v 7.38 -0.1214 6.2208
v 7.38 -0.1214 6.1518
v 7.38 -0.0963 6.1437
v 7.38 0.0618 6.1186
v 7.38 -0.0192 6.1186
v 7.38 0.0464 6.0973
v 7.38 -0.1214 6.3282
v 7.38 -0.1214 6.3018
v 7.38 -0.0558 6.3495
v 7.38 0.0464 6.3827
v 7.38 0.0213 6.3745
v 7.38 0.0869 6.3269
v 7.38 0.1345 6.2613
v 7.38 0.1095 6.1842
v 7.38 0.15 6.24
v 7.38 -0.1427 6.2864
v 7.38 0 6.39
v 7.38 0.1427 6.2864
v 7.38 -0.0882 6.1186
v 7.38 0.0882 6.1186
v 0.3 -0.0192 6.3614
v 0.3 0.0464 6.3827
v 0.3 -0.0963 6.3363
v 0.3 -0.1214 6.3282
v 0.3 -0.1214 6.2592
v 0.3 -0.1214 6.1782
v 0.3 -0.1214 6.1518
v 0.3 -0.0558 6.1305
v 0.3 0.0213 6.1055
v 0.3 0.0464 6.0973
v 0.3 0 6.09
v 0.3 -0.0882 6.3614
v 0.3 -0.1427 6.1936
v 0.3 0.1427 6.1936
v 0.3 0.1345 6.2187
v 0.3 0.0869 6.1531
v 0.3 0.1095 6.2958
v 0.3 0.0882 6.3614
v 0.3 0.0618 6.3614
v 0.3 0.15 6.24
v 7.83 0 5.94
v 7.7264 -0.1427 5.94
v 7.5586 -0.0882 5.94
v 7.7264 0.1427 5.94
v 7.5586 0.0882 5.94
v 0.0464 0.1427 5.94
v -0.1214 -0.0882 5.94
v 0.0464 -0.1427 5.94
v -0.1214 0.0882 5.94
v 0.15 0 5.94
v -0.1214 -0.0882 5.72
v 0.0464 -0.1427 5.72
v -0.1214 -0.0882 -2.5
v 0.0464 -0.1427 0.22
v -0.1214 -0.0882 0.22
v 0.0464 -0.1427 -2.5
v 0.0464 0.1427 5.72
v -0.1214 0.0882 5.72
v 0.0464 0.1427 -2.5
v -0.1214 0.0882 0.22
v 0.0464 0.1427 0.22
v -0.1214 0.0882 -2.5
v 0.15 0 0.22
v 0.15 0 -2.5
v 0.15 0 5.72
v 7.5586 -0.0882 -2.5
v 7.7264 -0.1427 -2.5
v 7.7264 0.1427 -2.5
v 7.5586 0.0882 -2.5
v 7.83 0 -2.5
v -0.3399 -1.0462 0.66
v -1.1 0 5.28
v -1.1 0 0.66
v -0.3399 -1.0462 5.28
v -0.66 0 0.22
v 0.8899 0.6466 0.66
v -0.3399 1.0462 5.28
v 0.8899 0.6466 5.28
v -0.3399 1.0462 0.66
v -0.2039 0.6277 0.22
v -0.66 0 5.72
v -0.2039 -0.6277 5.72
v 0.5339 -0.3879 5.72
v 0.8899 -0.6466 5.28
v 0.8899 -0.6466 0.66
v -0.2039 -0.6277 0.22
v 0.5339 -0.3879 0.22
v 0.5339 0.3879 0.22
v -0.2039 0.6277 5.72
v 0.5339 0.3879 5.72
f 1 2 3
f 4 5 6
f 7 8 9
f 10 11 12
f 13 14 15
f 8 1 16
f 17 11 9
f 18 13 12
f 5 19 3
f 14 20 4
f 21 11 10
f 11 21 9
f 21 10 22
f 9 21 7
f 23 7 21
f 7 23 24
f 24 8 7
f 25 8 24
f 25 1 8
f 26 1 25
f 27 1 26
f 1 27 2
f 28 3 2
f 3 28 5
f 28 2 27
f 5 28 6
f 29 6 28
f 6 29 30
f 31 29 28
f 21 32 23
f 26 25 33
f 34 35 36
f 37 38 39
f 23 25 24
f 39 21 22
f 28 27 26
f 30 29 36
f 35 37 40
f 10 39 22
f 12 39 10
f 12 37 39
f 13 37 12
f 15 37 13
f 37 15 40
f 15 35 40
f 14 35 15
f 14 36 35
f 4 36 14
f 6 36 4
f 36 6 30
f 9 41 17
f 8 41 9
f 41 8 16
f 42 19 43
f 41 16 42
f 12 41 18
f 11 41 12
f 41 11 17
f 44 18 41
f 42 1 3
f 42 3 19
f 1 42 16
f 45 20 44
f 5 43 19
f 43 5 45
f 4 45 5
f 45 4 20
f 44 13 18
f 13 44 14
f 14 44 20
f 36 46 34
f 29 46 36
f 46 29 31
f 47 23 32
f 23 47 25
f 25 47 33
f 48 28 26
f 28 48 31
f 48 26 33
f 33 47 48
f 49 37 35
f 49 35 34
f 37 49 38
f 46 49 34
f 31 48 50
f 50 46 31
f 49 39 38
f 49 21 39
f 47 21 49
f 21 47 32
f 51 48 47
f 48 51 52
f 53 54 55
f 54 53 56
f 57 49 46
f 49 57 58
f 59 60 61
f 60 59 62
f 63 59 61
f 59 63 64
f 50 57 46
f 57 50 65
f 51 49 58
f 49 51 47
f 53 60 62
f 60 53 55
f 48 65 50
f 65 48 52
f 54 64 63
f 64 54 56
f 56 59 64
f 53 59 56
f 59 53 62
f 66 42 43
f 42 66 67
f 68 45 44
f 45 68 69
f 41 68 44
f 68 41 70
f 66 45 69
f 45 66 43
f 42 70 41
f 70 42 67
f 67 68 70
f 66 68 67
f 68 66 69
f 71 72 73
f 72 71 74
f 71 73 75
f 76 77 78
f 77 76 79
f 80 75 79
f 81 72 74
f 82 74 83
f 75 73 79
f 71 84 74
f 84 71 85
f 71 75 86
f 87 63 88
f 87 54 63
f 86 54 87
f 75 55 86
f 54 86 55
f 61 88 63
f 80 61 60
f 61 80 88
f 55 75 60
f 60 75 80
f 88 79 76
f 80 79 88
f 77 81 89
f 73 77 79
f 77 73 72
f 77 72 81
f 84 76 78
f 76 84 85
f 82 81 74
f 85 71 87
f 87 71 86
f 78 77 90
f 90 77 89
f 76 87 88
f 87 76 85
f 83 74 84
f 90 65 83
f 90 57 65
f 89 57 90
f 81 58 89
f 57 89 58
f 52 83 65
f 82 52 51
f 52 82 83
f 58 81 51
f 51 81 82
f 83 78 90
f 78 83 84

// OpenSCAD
// Model for parametric acy() package
//
// Copyright (C) 2023 Erich Heinzle
//
// File distribution license:
//  This library is free software; you can redistribute it and/or
//  modify it under the terms of the GNU Lesser General Public
//  License as published by the Free Software Foundation; either
//  version 2.1 of the License, or (at your option) any later version.
//
//  This library is distributed in the hope that it will be useful,
//  but WITHOUT ANY WARRANTY; without even the implied warranty of
//  MERCHANTABILITY or FITNESS FOR A PARTICULAR PURPOSE.  See the GNU
//  Lesser General Public License for more details.
//
//  You should have received a copy of the GNU Lesser General Public
//  License along with this library; if not, write to the Free Software
//  Foundation, Inc., 51 Franklin Street, Fifth Floor, Boston, MA  02110-1301  USA
//
// The above distribution license applies when the file is distributed as a
// stand alone model file or as part of a library, in both cases intended
// for reuse combined by the user with other openscad scripts.
//
// Use license:
//  as a special exception, the content of the file may be
//  embedded in an openscad script that represents a printed circuit board,
//  for example when a board is exported by pcb-rnd. In such use case,
//  the content of this file may be copied into the resulting board file
//  with or without modifications, without affecting the board file's license
//  in any way.
//


module part_acy(pitch=7.68, standing=0, body=0, body_dia=2.3,pin_descent=2.5, pin_dia=0.3)
{
    
    pitch_mm = pitch;
    R_width = body_dia;
    R_length = 5.5;
    R_neck = 4*body_dia/5;
    body_ell = 1.2;

    module rounded_cylinder(r,h,n) {
        rotate_extrude(convexity=1) {
            offset(r=n) offset(delta=-n) square([r,h]);
                square([n,h]);
        }
    }

    module pins(standing=0, link=0) {
        radius=pin_dia;
        component_height=(1-link)*((standing*(R_length+(body_ell-1)*R_width+pin_dia))+(1-standing)*R_width/2)+link*pin_dia/2;

        color([0.8,0.8,0.8]) {
            //pin 1
            translate([0,0,-pin_descent])
                cylinder(r=pin_dia/2, h=pin_descent+component_height-radius);
            // pin 2
            translate([pitch_mm,0,-pin_descent])
                cylinder(r=pin_dia/2, h=pin_descent+component_height-radius);
            // link with ends bent
            rotate([90,0,0]) {
                translate([radius,component_height,0])
                    rotate([0,90,0])
                        cylinder(r=pin_dia/2,h=pitch_mm-radius*2);
                translate([pitch_mm-radius,component_height-radius,0])
                    rotate_extrude(angle=90, convexity=10)
                        translate([radius,0,0])
                            circle(pin_dia/2);
                translate([radius,component_height-radius,0])
                    rotate_extrude(angle=-90, convexity=10)
                        translate([-radius,0,0])
                            circle(pin_dia/2);
            }
        }
    }
    
    module body(body) {
        if (body == 1 || body == 2) { // resistor, inductor
            color([0.5,0.5,0.8]) {
                translate([-(R_length-R_width)/2,0,0])
                    scale([body_ell,1,1])
                        sphere(R_width/2);
                translate([(R_length-R_width)/2,0,0])
                    scale([body_ell,1,1])
                        sphere(R_width/2);
                translate([-(R_length-R_width)/2,0,0])
                    rotate([0,90,0])
                        cylinder(r=R_neck/2, h=R_length-R_width);
            }
        } else if (body == 3) { //ferrite bead
            color([0.3,0.3,0.3])
                translate([-(R_length)/3,0,0])
                    rotate([0,90,0])
                        cylinder(r=R_width/2, h=2*R_length/3);
        } else if (body == 4) { //axial electro
            color([0.3,0.5,0.6])
                translate([-R_length/2,0,R_width/2])
                    rotate([0,90,0])
                        union () {
                            translate([R_width/2,0,1.5*R_length/6])
                                rounded_cylinder(r=R_width/2, h=4.5*R_length/6, n=0.5);
                            translate([R_width/2,0,0])
                                rounded_cylinder(r=R_width/2, h=R_length/5, n=0.5);
                            translate([R_width/2,0,0])
                                cylinder(r=R_width/2-0.3, h=R_length);
                        }
        } else if (body == 5) {
            band_end = 1; // or 0
            union() {
                color([0.3,0.3,0.3]) {
                    translate([-(R_length)/2,0,0])
                        rotate([0,90,0])
                            cylinder(r=R_width/2, h=R_length);
                }
                color([0.9,0.9,0.9]) {
                    translate([(band_end-1)*(R_length)/3 + band_end*(R_length)/6,0,0])
                        rotate([0,90,0])
                            cylinder(r=R_width/2+0.01, h=R_length/7);
                }
            }
        } else if (body == 6) { // wirewound power resistor
            color([0.9,0.9,0.9])
                cube ([R_length,R_width,R_width],true);
        } else if (body == 7) { // axial monolithic capacitor
            color([0.9,0.9,0.5])
                rotate([0,90,0])
                    translate([0,0,-R_length/2])
                        rounded_cylinder(r=R_width/2, h=R_length, n=R_width/5);
        }
    }
    
    module aligned_body(standing=0, link=0,body) {
        if (!link) {
            if (standing) {
                translate([0,0,(R_length/2)+(body_ell-1)/2*R_width])
                    rotate([0,-90,0])
                        body(body);
            } else {
                translate([pitch_mm/2,0,R_width/2])
                    body(body);
            }
        }
    }
    
    if (body == 0) {
        pins(standing=0, link=1);
    }
    if (body == 1 || body == 2) { // resistor
        aligned_body(standing,link=0,body=1);
        pins(standing, link=0);
    }
    if (body == 3) { // ferrite bead
        aligned_body(standing,link=0,body=3);
        pins(standing, link=0);
    }
    if (body == 4) { // axial electro
        aligned_body(standing,link=0,body=4);
        pins(standing, link=0);
    }
    if (body == 5) { // diode
        aligned_body(standing,link=0,body=5);
        pins(standing, link=0);
    }
    if (body == 6) { // wirewound power resistor
        aligned_body(standing,link=0,body=6);
        pins(standing, link=0);
    }
    if (body == 7) { // monolithic capacitor
        aligned_body(standing,link=0,body=7);
        pins(standing, link=0);
    }
    if (body == 8) { // ceramic capacitor
        aligned_body(standing,link=0,body=8);
        pins(standing, link=0);
    }
    if (body == 9) { // two pin potentiometer
        aligned_body(standing,link=0,body=9);
        pins(standing, link=0);
    }
        
}

part_acy(standing=1,pitch=7.68, body=7, body_dia=2.2);
